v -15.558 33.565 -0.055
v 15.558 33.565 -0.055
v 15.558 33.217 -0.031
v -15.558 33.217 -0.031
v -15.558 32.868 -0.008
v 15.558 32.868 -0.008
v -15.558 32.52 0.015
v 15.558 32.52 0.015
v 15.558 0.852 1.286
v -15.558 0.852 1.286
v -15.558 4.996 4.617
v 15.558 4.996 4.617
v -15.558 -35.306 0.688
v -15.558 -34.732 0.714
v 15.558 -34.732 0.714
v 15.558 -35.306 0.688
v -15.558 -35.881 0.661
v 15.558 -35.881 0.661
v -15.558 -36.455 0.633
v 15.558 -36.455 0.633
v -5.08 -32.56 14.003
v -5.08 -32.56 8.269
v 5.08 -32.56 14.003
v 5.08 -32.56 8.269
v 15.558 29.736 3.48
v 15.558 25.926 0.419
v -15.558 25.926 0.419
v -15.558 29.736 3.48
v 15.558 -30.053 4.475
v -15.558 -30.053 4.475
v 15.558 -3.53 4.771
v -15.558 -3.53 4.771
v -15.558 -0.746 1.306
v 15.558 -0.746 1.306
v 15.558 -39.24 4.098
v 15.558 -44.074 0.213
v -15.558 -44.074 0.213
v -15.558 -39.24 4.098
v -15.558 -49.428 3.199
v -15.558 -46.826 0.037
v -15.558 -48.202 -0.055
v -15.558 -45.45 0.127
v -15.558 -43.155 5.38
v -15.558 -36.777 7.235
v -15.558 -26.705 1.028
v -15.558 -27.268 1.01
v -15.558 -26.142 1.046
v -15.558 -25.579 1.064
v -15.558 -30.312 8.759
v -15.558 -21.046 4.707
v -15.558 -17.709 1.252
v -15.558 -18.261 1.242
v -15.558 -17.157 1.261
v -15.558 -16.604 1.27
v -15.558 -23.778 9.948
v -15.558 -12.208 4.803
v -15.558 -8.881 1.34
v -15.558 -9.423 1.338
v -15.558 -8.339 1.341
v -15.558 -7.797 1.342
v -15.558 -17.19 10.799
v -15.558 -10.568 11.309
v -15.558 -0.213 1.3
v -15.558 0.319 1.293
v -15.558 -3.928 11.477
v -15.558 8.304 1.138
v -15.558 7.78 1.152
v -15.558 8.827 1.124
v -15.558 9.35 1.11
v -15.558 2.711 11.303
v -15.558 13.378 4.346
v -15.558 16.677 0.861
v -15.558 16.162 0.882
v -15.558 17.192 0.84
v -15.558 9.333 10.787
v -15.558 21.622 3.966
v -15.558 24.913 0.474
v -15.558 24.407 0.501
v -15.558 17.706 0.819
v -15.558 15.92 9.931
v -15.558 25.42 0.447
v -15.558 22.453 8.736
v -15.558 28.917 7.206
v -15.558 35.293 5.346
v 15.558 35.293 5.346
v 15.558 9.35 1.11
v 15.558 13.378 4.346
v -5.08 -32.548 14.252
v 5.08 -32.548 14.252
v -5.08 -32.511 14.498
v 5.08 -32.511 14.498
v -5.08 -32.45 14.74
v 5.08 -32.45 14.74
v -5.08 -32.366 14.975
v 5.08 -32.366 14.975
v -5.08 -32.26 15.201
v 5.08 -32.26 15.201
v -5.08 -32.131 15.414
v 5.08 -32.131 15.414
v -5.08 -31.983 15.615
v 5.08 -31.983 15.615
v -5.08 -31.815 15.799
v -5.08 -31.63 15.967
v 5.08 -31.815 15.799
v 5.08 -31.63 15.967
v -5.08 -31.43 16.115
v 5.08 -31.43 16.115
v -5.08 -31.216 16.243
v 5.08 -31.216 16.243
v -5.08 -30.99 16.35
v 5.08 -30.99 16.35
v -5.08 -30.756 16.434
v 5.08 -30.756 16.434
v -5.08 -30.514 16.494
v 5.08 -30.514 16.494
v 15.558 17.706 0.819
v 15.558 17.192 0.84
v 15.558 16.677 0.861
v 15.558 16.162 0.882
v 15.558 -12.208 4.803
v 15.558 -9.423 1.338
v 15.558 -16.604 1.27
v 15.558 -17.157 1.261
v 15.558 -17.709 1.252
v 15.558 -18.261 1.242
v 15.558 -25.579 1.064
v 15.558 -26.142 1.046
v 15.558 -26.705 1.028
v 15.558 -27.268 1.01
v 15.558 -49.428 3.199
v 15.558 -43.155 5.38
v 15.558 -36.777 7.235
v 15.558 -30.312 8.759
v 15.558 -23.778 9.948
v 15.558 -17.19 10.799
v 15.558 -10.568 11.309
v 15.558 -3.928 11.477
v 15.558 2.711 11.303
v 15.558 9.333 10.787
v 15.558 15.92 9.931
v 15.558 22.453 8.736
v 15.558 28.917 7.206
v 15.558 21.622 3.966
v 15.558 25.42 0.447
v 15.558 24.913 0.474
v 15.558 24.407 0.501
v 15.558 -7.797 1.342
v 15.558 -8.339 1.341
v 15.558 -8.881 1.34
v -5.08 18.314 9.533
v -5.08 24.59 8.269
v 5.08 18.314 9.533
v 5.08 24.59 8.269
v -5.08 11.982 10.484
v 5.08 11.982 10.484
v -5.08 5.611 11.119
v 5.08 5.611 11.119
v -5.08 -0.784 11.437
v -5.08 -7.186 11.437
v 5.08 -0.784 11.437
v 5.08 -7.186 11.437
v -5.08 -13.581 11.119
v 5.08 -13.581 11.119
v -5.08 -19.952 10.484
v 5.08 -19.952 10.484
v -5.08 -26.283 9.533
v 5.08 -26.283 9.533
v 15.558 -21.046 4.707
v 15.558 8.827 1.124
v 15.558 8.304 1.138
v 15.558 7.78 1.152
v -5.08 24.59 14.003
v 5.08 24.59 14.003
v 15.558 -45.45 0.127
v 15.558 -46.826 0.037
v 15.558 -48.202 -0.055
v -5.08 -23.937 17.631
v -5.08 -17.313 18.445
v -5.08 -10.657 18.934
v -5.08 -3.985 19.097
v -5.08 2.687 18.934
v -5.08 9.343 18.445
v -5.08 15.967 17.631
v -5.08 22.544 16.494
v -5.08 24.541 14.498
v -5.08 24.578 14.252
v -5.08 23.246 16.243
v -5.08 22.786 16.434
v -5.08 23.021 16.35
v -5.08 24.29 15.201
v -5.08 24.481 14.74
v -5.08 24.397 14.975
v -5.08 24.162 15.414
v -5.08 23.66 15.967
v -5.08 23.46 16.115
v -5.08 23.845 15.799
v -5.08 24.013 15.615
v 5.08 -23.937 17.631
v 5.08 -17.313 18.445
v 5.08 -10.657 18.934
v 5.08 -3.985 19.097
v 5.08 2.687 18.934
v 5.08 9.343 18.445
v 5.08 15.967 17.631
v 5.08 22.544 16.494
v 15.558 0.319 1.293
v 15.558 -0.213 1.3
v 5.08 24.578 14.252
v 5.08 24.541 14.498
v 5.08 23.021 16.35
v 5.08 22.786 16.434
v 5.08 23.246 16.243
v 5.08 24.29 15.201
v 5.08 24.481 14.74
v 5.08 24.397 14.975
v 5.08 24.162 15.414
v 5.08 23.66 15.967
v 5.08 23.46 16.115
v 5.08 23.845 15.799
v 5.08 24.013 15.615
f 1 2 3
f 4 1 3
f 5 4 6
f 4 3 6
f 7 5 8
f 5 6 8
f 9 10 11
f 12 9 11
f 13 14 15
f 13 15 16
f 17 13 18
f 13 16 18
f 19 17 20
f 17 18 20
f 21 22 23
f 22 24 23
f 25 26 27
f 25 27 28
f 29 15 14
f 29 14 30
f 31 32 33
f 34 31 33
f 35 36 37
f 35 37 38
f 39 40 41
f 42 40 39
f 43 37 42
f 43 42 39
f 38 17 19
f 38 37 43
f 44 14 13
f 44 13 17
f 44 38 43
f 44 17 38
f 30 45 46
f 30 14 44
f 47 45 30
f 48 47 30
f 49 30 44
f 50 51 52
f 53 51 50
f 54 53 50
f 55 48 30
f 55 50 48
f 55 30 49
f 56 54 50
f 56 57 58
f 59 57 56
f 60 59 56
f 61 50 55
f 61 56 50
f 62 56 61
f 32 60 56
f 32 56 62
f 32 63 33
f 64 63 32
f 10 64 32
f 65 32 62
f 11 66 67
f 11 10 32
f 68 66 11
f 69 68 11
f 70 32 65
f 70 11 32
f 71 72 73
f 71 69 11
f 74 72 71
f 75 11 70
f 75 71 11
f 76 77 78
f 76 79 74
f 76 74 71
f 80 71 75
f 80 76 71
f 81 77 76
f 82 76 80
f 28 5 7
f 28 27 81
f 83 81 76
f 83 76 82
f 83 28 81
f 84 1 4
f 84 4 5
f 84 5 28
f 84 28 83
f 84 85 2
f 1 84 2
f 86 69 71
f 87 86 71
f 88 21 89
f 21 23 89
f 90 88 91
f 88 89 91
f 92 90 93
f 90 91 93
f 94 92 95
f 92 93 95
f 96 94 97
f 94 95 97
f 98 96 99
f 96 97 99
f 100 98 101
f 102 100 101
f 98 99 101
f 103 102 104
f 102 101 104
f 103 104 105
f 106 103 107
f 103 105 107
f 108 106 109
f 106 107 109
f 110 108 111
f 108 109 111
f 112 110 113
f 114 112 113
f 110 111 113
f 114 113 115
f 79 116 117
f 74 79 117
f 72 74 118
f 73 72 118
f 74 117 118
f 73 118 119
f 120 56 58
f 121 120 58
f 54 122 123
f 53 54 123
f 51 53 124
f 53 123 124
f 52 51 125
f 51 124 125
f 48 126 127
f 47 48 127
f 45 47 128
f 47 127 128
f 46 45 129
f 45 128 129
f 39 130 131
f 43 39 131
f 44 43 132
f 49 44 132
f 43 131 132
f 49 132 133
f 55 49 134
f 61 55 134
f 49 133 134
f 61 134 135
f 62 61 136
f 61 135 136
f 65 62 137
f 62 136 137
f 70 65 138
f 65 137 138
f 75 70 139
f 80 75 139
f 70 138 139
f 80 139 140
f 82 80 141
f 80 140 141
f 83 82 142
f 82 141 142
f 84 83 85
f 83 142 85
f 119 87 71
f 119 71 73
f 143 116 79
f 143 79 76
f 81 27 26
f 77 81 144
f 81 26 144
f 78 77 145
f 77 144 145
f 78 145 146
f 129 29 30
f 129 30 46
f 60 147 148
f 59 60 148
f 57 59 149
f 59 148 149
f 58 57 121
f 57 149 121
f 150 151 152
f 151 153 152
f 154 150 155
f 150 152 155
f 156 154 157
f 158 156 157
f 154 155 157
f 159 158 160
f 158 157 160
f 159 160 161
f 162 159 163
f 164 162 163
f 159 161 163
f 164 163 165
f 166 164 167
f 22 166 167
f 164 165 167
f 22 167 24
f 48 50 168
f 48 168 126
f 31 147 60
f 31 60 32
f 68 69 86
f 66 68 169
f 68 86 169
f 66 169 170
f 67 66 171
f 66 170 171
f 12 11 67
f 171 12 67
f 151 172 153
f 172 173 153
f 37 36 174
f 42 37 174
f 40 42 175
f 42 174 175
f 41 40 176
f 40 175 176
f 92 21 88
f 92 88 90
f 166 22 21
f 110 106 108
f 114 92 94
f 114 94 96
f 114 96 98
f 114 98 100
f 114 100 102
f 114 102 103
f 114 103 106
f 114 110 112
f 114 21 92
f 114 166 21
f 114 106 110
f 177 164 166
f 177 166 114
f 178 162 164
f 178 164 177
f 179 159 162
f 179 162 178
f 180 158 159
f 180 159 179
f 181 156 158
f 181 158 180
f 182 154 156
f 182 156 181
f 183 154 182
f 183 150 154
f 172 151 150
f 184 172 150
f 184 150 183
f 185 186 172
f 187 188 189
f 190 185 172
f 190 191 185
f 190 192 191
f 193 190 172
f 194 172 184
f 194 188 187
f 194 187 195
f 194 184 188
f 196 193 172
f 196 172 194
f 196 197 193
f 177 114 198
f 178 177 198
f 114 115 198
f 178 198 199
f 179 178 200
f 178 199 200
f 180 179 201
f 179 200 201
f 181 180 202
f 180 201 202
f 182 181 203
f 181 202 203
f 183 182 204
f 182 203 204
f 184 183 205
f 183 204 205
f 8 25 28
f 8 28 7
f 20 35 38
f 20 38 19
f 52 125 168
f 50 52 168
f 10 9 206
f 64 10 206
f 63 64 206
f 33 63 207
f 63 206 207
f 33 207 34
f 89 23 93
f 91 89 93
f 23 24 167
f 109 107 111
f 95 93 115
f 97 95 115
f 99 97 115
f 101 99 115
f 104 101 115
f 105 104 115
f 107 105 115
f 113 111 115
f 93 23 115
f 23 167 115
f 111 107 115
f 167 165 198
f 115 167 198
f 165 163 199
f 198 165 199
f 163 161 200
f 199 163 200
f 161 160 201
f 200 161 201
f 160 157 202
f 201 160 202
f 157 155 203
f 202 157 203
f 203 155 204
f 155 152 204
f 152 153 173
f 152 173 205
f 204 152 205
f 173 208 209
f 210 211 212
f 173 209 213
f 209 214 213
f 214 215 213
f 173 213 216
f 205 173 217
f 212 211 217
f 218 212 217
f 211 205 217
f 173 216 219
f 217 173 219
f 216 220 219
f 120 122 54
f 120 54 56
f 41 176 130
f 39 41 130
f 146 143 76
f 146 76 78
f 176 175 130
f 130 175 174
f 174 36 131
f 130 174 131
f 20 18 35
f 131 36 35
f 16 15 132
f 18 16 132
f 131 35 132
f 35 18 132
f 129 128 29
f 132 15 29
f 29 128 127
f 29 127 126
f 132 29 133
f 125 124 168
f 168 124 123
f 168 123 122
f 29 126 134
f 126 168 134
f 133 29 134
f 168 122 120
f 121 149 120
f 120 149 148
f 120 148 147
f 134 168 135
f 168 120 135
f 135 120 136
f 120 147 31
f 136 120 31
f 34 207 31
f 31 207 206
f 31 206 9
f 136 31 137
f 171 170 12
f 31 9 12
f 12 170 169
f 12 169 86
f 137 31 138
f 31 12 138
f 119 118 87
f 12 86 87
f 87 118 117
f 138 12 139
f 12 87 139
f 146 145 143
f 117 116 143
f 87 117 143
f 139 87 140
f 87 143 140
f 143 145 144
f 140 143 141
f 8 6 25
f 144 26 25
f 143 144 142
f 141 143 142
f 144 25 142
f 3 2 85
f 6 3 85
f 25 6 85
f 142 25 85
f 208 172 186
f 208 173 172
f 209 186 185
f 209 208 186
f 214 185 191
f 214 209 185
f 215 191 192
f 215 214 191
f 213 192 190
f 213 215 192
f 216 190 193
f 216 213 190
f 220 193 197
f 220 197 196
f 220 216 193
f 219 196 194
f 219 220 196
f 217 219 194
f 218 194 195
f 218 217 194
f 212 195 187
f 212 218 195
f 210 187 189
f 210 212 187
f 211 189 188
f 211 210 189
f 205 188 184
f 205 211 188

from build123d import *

# Parameters (mm, degrees)
BOSS_EXTRUDE1_DEPTH = 63.5
SKETCH2_W           = 6.985
SKETCH2_H           = 9.525
CUT_EXTRUDE1_DEPTH  = 98.190271375
CUT_EXTRUDE2_DEPTH  = 98.190271375
CUT_EXTRUDE3_DEPTH  = 98.190271375
FILLET1_R           = 2.54
CUT_EXTRUDE4_DEPTH  = 5.08
CUT_EXTRUDE6_DEPTH  = 15.113
FILLET2_R           = 0.508
BOSS_EXTRUDE2_DEPTH = 31.115
BOSS_EXTRUDE3_DEPTH = 5.08
CUT_EXTRUDE7_DEPTH  = 62.449228845
FILLET3_R           = 2.54


with BuildPart() as part:
    # Sketch1 → Boss-Extrude1 (new body)
    with BuildSketch(Plane.XY):
        Polygon((-15.5575, 57.15), (15.5575, 57.15), (15.5575, -57.15), (7.845485509, -57.15), (9.525, -66.675), (-9.525, -66.675), (-7.845485509, -57.15), (-15.5575, -57.15), align=None)
    extrude(amount=BOSS_EXTRUDE1_DEPTH)

    # Sketch2 → Cut-Extrude1 (cut, through all)
    with BuildSketch(Plane(origin=(15.5575, 0, 0), x_dir=(0, 0, -1), z_dir=(1, 0, 0))):
        with Locations((-3.4925, -61.9125)):
            Rectangle(SKETCH2_W, SKETCH2_H)
    extrude(amount=-CUT_EXTRUDE1_DEPTH, mode=Mode.SUBTRACT)

    # Sketch3 → Cut-Extrude2 (cut, through all)
    with BuildSketch(Plane(origin=(15.5575, 0, 0), x_dir=(0, 0, -1), z_dir=(1, 0, 0))):
        with BuildLine():
            Line((-63.5, -66.675), (-63.5, -57.15))
            Line((-63.5, -57.15), (-63.5, 57.15))
            Line((-63.5, 57.15), (-6.541803462, 57.15))
            ThreePointArc((-6.541803462, 57.15), (-48.577712048, 1.473490038), (-63.5, -66.675))
        make_face()
        with BuildLine():
            Line((0, -57.15), (0, 49.180173588))
            ThreePointArc((0, 49.180173588), (-11.476941242, -3.984913206), (0, -57.15))
        make_face()
    extrude(amount=-CUT_EXTRUDE2_DEPTH, mode=Mode.SUBTRACT)

    # Sketch6 → Cut-Extrude3 (cut, through all)
    with BuildSketch(Plane(origin=(15.5575, 0, 0), x_dir=(0, 0, -1), z_dir=(1, 0, 0))):
        with BuildLine():
            ThreePointArc((-47.632075843, -49.890456381), (-52.498873953, -48.968704782), (-54.267408906, -44.34186634))
            ThreePointArc((-54.267408906, -44.34186634), (-39.547918107, 2.686780726), (-10.848565028, 42.745539907))
            ThreePointArc((-10.848565028, 42.745539907), (-19.036412689, 0.07961245), (-13.402903517, -42.998059138))
            ThreePointArc((-13.402903517, -42.998059138), (-14.664693682, -48.027852091), (-19.684337414, -49.329431277))
            ThreePointArc((-19.684337414, -49.329431277), (-33.70089031, -47.483635481), (-47.632075843, -49.890456381))
        make_face()
    extrude(amount=-CUT_EXTRUDE3_DEPTH, mode=Mode.SUBTRACT)

    # Fillet1
    fillet1_edges = [part.edges().sort_by_distance(p)[0] for p in [
        (0, 42.745539907, 10.848565028),
    ]]
    fillet(fillet1_edges, radius=FILLET1_R)

    # Sketch7 → Cut-Extrude4 (cut, symmetric)
    with BuildSketch(Plane(origin=(0, 0, 0), x_dir=(0, 0, -1), z_dir=(1, 0, 0))):
        with BuildLine():
            Line((-19.096941242, 24.590086794), (-8.26917315, 24.590086794))
            ThreePointArc((-8.26917315, 24.590086794), (-11.476941242, -3.984913206), (-8.26917315, -32.559913206))
            Line((-8.26917315, -32.559913206), (-19.096941242, -32.559913206))
            Line((-19.096941242, -32.559913206), (-19.096941242, 24.590086794))
        make_face()
    extrude(amount=CUT_EXTRUDE4_DEPTH, both=True, mode=Mode.SUBTRACT)

    # Sketch10 → Cut-Extrude6 (cut, symmetric)
    with BuildSketch(Plane(origin=(15.5575, 57.15, 6.541803462), x_dir=(-1, 0, 0), z_dir=(0, -0.7729564233131586, -0.6344591142531796))):
        Polygon((0, 5.056529006), (6.985, 5.056529006), (0, -3.769970994), align=None)
        Polygon((31.115, 5.056529006), (31.115, -3.769970994), (24.13, 5.056529006), align=None)
    extrude(amount=CUT_EXTRUDE6_DEPTH, both=True, mode=Mode.SUBTRACT)

    # Fillet2
    fillet2_edges = [part.edges().sort_by_distance(p)[0] for p in [
        (0, 57.15, 6.541803462),
        (-14.065958943, 55.91454615, 7.966671007),
        (14.065958943, 55.91454615, 7.966671007),
        (-15.5575, 4.078442286, 47.351485464),
        (15.5575, 4.078442286, 47.351485464),
    ]]
    fillet(fillet2_edges, radius=FILLET2_R)


with BuildPart() as body_2:
    # Sketch11 → Boss-Extrude2 (new body)
    with BuildSketch(Plane(origin=(15.5575, 0, 0), x_dir=(0, 0, -1), z_dir=(1, 0, 0))):
        with BuildLine():
            Line((-5.34582736, 35.292800385), (0.055075628, 33.564565837))
            ThreePointArc((0.055075628, 33.564565837), (-1.342086932, -7.3188165), (0.055075628, -48.202198838))
            Line((0.055075628, -48.202198838), (-3.199195761, -49.428446626))
            ThreePointArc((-3.199195761, -49.428446626), (-11.435591811, -7.249318258), (-5.34582736, 35.292800385))
        make_face()
    extrude(amount=-BOSS_EXTRUDE2_DEPTH)

    # Sketch13 → Cut-Extrude7 (cut, through all)
    with BuildSketch(Plane(origin=(15.5575, 0, 0), x_dir=(0, 0, -1), z_dir=(1, 0, 0))):
        Polygon((-0.01545939, 32.520387834), (3.046263496, 28.710387834), (-0.418602323, 25.926015399), (-3.480325209, 29.736015399), align=None)
        Polygon((-0.501135954, 24.406767474), (2.645881347, 20.490627326), (-0.818984472, 17.706254892), (-3.966001773, 21.622395039), align=None)
        Polygon((-0.881569002, 16.162182357), (2.354819424, 12.134829013), (-1.110046395, 9.350456578), (-4.346434821, 13.377809922), align=None)
        Polygon((-1.151706999, 7.780346365), (2.178520725, 3.636219644), (-1.286345095, 0.851847209), (-4.616572818, 4.99597393), align=None)
        Polygon((-1.30601154, -0.745632478), (2.122969817, -5.012647965), (-1.341896002, -7.797020399), (-4.770877359, -3.530004913), align=None)
        Polygon((-1.338389041, -9.423337013), (2.194771451, -13.819992745), (-1.270094368, -16.604365179), (-4.80325486, -12.207709448), align=None)
        Polygon((-4.706975335, -21.045514452), (-1.063621254, -25.579294799), (2.401244565, -22.794922364), (-1.242109516, -18.261142017), align=None)
        Polygon((-1.00970931, -27.268335243), (2.750535553, -31.947574174), (-0.714330267, -34.731946609), (-4.474575129, -30.052707677), align=None)
        Polygon((-0.632873728, -36.455263474), (3.25175586, -41.289286435), (-0.213109959, -44.07365887), (-4.097739547, -39.239635909), align=None)
    extrude(amount=-CUT_EXTRUDE7_DEPTH, mode=Mode.SUBTRACT)


with BuildPart() as body_3:
    # Sketch12 → Boss-Extrude3 (new, symmetric)
    with BuildSketch(Plane(origin=(0, 0, 0), x_dir=(0, 0, -1), z_dir=(1, 0, 0))):
        with BuildLine():
            Line((-16.072430628, 24.590086794), (-8.26917315, 24.590086794))
            ThreePointArc((-8.26917315, 24.590086794), (-11.476941242, -3.984913206), (-8.26917315, -32.559913206))
            Line((-8.26917315, -32.559913206), (-16.072430628, -32.559913206))
            ThreePointArc((-16.072430628, -32.559913206), (-19.096941242, -3.984913206), (-16.072430628, 24.590086794))
        make_face()
    extrude(amount=BOSS_EXTRUDE3_DEPTH, both=True)

    # Fillet3
    fillet3_edges = [body_3.edges().sort_by_distance(p)[0] for p in [
        (0, 24.590086794, 16.072430628),
        (0, -32.559913206, 16.072430628),
    ]]
    fillet(fillet3_edges, radius=FILLET3_R)


solid = Compound([body_2.part, body_3.part])
